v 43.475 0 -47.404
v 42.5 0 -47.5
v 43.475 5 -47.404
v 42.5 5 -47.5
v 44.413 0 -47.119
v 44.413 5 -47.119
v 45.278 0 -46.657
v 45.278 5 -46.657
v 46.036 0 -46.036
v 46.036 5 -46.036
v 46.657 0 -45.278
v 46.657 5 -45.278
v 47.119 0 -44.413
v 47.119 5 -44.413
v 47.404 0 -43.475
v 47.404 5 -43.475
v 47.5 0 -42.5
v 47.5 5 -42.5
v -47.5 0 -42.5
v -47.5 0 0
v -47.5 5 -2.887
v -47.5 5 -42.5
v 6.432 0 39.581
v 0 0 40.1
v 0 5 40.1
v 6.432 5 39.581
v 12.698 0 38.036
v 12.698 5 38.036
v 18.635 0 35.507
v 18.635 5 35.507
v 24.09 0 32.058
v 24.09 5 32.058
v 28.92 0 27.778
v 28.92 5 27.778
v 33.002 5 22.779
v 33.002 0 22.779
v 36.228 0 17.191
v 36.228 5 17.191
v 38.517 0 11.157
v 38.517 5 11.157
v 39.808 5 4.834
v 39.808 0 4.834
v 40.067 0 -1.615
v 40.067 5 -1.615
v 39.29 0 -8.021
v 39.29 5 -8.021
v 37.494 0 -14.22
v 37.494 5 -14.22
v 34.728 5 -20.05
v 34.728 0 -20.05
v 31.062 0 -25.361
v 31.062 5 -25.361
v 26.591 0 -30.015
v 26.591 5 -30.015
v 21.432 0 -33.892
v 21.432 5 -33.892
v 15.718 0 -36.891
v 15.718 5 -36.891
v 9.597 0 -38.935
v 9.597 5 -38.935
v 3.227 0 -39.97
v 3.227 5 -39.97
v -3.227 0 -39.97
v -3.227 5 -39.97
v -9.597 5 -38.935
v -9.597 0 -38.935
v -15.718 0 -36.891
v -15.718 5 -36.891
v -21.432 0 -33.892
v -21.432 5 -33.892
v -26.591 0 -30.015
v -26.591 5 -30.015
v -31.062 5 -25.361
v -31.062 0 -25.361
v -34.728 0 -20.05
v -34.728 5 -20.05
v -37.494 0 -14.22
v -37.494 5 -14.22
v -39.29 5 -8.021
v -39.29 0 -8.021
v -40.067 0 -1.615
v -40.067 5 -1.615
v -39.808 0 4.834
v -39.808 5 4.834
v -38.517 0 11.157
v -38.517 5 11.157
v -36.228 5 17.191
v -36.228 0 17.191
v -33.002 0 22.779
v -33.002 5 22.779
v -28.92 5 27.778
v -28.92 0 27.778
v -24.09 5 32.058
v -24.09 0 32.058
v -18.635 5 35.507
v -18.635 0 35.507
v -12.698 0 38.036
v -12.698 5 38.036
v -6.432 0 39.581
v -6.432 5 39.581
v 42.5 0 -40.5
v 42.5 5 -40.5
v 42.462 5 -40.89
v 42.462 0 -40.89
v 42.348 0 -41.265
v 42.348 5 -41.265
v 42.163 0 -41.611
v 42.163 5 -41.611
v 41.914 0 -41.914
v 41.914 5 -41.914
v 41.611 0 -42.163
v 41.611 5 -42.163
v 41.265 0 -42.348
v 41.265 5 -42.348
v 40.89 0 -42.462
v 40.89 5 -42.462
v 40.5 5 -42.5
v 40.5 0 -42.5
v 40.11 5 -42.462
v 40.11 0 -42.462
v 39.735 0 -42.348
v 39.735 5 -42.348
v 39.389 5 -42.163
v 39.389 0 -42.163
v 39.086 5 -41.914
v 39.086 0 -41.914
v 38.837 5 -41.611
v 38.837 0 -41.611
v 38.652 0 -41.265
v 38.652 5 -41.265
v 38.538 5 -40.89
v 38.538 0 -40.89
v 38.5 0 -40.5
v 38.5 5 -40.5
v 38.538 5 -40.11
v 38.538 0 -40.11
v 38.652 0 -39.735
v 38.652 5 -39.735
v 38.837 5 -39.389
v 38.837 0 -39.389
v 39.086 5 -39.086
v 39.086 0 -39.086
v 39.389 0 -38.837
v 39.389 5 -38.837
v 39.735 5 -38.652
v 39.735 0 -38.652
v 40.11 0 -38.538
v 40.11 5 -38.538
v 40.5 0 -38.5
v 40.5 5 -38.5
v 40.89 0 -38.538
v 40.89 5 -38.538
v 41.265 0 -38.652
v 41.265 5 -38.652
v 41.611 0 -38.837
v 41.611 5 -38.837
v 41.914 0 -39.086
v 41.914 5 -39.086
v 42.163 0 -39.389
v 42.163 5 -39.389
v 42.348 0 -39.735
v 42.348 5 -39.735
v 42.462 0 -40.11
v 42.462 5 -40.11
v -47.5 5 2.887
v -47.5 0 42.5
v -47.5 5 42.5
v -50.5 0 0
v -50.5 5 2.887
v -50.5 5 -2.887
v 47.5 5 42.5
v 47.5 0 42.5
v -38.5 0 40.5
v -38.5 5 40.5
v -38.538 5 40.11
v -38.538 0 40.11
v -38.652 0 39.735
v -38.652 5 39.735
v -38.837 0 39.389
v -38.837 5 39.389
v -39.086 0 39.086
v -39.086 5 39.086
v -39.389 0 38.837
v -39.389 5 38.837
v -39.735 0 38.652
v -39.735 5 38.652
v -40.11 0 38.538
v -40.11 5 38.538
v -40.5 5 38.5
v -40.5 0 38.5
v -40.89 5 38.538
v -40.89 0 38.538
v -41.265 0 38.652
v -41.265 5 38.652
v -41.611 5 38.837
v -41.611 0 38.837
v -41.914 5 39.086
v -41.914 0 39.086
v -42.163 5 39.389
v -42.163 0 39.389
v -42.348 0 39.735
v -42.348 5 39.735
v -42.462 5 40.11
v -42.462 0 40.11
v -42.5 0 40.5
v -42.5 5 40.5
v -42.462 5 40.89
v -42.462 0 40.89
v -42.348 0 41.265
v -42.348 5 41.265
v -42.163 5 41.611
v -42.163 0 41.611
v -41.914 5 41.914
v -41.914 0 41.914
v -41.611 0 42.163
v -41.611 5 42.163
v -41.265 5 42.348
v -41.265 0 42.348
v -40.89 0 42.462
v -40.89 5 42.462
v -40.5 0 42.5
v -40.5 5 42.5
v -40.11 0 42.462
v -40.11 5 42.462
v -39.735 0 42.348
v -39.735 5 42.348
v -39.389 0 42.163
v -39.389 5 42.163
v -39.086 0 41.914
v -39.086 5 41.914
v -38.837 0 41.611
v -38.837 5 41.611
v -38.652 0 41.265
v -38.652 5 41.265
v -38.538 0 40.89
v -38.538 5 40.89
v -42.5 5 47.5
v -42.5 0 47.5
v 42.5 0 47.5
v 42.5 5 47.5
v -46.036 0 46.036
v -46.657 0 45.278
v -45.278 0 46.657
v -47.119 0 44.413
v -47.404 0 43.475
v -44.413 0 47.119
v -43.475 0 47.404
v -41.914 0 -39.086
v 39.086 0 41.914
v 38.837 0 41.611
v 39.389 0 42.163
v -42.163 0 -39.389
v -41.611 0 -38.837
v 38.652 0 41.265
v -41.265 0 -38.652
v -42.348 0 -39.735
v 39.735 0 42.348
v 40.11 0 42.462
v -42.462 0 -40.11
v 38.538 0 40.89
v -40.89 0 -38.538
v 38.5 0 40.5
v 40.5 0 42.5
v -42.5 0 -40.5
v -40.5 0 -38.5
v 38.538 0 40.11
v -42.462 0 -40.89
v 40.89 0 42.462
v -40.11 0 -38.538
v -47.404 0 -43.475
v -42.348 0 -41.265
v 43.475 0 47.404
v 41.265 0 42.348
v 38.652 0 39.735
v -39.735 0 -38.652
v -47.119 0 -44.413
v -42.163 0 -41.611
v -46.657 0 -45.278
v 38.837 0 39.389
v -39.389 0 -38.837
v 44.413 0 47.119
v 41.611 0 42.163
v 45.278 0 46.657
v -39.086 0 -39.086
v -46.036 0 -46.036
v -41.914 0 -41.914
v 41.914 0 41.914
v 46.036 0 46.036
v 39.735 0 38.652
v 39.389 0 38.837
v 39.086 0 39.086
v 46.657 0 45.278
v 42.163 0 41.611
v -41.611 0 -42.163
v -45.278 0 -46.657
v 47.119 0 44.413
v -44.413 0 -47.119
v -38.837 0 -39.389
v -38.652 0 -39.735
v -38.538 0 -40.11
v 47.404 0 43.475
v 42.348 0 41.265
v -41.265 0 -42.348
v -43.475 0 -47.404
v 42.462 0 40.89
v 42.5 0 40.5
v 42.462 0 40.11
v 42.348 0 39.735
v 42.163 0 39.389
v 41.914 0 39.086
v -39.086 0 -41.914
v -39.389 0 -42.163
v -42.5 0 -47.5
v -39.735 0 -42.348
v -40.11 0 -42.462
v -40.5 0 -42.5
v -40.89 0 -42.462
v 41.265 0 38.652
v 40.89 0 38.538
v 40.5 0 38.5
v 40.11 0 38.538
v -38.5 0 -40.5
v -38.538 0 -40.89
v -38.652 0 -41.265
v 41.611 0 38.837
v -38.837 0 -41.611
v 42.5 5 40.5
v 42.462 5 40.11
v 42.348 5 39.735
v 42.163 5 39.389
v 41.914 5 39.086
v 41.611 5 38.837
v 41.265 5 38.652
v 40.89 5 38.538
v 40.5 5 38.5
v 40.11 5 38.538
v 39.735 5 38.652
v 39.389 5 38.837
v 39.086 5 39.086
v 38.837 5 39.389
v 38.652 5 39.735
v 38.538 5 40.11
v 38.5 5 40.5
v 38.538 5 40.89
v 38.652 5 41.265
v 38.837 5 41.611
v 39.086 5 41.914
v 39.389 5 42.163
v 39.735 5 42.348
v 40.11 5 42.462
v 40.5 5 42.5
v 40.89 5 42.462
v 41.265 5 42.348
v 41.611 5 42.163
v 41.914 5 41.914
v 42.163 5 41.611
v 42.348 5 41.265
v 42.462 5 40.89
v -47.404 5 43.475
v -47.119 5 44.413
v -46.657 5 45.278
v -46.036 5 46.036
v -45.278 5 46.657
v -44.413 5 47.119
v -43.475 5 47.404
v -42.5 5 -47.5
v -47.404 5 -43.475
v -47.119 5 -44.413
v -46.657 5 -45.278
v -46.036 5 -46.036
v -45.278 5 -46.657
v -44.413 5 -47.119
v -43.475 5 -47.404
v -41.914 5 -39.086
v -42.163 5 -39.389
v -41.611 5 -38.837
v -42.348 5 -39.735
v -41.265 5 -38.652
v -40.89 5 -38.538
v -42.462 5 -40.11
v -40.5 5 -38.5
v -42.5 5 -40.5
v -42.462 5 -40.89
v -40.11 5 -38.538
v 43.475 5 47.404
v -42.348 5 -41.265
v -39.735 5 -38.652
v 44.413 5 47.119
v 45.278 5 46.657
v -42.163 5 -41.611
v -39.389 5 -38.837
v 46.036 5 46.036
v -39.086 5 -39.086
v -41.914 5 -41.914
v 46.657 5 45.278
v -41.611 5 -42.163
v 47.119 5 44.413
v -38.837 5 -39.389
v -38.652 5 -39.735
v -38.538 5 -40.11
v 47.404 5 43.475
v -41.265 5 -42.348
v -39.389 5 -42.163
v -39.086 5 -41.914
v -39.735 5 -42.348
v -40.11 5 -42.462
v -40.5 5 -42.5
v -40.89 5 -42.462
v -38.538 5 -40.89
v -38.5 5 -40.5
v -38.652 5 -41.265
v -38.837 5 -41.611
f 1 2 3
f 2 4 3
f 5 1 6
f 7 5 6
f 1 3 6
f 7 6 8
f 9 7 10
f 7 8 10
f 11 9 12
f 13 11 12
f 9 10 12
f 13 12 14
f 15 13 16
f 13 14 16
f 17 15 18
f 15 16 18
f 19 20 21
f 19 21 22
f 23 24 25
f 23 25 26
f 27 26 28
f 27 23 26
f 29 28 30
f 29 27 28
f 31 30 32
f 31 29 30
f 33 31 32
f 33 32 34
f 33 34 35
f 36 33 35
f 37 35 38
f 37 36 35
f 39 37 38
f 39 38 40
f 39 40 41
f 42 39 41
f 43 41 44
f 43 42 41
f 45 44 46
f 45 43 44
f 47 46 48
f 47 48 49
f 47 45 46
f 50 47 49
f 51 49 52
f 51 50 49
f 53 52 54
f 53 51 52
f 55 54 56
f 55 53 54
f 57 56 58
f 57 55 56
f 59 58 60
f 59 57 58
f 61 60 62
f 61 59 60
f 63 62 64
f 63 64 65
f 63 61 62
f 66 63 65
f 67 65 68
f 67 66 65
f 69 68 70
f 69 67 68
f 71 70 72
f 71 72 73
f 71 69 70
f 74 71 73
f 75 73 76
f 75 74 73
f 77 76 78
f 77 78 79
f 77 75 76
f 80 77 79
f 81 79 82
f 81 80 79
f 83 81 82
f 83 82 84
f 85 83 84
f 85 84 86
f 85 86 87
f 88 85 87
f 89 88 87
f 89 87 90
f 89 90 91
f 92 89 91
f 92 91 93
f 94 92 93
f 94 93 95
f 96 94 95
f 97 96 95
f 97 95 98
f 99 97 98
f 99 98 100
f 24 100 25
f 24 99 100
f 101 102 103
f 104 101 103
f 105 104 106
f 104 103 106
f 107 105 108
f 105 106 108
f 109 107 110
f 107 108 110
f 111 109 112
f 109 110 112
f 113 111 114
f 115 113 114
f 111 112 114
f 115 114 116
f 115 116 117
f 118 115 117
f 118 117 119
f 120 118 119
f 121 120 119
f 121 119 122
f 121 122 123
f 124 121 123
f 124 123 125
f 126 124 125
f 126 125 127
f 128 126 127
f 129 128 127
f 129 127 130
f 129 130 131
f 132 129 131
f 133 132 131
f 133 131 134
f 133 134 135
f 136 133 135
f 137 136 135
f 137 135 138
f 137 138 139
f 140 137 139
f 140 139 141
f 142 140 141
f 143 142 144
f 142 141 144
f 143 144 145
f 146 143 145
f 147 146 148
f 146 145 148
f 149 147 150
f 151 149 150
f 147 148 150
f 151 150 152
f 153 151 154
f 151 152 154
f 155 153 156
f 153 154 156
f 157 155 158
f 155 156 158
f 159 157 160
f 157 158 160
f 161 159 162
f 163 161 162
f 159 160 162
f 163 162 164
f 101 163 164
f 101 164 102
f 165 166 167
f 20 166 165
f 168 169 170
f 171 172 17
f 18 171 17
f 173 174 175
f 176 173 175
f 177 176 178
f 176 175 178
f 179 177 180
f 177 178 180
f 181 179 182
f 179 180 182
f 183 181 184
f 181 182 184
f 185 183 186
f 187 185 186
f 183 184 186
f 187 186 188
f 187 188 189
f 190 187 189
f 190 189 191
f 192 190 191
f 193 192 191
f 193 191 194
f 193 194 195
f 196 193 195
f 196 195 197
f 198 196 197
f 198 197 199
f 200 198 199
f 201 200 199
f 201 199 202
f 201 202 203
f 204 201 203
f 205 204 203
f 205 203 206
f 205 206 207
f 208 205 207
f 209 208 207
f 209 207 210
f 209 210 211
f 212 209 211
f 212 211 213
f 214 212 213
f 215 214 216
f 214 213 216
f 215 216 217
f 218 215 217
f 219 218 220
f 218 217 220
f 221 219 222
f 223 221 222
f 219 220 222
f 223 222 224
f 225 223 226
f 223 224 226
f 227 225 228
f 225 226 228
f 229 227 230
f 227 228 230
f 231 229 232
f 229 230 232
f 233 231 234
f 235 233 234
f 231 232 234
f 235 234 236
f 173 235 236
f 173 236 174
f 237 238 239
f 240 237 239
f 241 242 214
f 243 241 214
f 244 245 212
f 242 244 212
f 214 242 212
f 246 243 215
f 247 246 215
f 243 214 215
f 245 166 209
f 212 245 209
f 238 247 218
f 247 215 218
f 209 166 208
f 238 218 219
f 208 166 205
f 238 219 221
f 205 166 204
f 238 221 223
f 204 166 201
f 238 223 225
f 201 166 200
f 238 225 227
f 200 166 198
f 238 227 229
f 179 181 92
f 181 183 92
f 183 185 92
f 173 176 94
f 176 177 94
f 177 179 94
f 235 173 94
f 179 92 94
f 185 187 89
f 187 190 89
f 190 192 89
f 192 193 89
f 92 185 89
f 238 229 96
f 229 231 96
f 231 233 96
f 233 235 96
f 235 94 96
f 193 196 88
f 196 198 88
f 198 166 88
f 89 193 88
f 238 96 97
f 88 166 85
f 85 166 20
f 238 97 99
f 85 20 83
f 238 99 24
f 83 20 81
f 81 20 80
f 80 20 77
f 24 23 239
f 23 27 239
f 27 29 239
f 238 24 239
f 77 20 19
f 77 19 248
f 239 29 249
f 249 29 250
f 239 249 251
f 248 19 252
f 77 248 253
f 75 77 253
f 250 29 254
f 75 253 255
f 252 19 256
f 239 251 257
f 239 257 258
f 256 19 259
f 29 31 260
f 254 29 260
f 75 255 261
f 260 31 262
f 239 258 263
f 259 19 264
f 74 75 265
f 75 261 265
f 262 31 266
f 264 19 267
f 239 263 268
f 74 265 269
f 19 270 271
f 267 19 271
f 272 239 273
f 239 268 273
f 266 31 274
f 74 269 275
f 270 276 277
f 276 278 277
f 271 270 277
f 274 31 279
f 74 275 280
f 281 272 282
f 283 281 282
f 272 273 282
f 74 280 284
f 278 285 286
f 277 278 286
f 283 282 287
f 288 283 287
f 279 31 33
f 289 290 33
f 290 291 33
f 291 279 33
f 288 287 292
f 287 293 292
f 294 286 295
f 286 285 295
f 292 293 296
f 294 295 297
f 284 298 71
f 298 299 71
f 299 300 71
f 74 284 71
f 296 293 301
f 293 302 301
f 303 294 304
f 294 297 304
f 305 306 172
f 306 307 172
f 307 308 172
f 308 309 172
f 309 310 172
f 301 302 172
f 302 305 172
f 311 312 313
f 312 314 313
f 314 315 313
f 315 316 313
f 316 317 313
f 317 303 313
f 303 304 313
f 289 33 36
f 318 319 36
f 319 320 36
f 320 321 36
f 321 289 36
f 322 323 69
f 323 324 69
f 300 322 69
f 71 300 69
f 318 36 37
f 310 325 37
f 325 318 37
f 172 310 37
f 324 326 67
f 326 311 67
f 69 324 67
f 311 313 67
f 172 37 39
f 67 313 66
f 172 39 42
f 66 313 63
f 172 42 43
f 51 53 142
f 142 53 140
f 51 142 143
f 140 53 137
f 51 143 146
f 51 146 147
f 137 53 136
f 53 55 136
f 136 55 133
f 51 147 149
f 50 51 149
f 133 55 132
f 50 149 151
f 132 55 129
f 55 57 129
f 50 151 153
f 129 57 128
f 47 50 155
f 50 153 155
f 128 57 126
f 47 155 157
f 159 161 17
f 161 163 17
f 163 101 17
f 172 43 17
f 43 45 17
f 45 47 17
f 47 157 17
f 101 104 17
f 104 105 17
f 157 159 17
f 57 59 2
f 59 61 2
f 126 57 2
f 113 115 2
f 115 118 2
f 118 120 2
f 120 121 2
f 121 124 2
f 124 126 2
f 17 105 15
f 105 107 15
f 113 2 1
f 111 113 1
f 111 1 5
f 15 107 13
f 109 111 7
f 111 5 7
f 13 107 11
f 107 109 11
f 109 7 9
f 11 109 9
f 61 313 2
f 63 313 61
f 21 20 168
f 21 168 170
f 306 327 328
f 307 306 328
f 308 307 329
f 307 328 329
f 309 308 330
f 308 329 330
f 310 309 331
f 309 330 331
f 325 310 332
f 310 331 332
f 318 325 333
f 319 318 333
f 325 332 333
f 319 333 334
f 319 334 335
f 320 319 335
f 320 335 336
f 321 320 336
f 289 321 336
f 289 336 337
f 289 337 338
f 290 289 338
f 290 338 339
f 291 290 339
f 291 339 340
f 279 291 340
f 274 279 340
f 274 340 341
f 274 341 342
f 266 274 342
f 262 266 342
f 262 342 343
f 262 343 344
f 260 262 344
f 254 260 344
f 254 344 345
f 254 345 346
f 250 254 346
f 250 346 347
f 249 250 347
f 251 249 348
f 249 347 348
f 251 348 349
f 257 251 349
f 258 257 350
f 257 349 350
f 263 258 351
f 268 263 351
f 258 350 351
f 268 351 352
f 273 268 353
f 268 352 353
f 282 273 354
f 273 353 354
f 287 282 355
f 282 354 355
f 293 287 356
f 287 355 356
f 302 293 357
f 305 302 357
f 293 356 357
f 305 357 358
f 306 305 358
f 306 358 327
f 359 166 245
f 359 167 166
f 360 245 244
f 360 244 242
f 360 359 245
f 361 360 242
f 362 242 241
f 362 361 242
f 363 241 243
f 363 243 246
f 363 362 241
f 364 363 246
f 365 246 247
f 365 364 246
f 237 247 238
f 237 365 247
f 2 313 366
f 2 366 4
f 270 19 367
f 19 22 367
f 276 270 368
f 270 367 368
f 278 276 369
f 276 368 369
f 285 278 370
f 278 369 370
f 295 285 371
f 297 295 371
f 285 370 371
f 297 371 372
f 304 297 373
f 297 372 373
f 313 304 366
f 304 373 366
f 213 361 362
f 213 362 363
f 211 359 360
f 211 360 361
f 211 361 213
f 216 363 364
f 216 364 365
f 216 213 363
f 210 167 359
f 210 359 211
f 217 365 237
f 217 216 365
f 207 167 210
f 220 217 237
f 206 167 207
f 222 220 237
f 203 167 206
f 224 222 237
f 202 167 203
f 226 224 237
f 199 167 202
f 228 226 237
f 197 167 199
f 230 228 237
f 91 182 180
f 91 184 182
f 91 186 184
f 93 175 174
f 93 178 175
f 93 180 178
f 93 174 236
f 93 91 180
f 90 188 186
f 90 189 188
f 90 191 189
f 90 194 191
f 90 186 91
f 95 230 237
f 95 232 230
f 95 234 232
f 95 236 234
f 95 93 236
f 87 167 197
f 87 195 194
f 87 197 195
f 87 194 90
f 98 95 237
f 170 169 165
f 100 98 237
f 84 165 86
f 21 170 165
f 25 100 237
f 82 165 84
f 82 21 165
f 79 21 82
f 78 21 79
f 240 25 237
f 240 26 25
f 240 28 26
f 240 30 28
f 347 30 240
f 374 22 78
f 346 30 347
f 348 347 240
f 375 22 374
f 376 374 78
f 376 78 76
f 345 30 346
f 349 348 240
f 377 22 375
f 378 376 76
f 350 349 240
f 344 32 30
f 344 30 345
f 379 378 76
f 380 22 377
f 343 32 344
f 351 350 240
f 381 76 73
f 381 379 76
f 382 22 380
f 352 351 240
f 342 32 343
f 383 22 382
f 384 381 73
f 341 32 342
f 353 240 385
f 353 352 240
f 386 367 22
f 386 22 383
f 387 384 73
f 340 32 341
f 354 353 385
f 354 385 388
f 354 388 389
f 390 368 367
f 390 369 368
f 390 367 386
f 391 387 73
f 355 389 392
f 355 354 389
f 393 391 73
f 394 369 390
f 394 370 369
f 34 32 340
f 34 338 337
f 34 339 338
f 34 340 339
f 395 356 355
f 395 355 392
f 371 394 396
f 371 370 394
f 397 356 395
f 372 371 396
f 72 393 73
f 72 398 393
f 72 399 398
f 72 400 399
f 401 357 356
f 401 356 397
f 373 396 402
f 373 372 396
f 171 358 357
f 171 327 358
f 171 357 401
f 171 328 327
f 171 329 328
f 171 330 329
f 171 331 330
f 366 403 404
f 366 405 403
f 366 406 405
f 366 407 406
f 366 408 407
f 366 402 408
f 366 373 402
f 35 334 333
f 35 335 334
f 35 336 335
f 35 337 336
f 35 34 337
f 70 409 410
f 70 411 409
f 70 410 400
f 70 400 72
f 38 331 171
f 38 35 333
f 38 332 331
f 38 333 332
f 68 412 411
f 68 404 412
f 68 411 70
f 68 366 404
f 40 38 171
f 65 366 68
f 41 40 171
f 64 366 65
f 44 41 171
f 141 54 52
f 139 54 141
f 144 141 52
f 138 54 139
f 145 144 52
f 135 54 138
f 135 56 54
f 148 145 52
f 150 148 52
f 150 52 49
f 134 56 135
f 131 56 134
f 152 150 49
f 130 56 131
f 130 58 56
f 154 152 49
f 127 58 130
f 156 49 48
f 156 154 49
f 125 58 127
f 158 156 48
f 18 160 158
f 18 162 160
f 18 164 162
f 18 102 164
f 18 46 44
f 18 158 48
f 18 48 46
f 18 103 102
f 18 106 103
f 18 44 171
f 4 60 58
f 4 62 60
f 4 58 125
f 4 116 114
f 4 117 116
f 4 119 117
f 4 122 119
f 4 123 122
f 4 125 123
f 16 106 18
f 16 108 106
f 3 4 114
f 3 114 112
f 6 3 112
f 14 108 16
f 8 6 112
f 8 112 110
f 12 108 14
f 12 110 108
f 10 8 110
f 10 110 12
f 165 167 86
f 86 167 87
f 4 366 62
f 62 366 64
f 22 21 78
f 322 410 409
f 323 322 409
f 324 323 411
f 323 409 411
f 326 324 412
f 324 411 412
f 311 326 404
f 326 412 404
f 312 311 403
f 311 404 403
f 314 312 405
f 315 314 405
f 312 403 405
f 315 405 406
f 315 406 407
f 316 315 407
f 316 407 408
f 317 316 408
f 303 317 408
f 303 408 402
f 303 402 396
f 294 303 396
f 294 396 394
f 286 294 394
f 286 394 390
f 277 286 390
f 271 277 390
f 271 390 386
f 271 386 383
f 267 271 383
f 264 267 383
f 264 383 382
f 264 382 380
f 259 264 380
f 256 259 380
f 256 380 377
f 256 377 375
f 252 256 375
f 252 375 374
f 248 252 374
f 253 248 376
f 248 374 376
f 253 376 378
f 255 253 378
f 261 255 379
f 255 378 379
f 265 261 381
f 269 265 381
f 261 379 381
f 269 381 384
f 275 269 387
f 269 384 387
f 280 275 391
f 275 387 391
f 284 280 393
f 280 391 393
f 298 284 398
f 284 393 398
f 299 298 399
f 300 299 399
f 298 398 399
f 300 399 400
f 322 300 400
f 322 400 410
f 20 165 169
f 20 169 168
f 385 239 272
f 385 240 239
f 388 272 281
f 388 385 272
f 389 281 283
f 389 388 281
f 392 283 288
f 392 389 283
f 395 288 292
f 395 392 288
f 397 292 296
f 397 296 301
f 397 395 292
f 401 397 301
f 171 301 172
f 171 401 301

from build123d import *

# Parameters (mm, degrees)
SKETCH1_W             = 95
SKETCH1_H             = 95
SKETCH1_W_2           = 81
SKETCH1_H_2           = 81
SKETCH1_R             = 40.1
BOSS_EXTRUDE1_DEPTH   = 5
F_4_0MM_DOWEL_HOLE1_D = 4
BOSS_EXTRUDE2_DEPTH   = 3
FILLET1_R             = 5


with BuildPart() as part:
    # Sketch1 → Boss-Extrude1 (new body)
    # profile 1 of 2: a face of its own
    with BuildSketch(Plane(origin=(0, 0, 0), x_dir=(1, 0, 0), z_dir=(0, 1, 0))):
        Rectangle(SKETCH1_W, SKETCH1_H)
        Rectangle(SKETCH1_W_2, SKETCH1_H_2, mode=Mode.SUBTRACT)
    # profile 2 of 2: a face of its own
    with BuildSketch(Plane(origin=(0, 0, 0), x_dir=(1, 0, 0), z_dir=(0, 1, 0))):
        Rectangle(SKETCH1_W_2, SKETCH1_H_2)
        with Locations(Location((0, 0, 0), (0, 0, 270))):
            Circle(SKETCH1_R, mode=Mode.SUBTRACT)
    extrude(amount=BOSS_EXTRUDE1_DEPTH)

    # Ø4.0mm Dowel Hole1 (through all)
    with Locations(Plane(origin=(0, 0, 0), x_dir=(-1, 0, 0), z_dir=(0, -1, 0))):
        with Locations((40.5, -40.5), (-40.5, -40.5), (-40.5, 40.5), (40.5, 40.5)):
            Hole(F_4_0MM_DOWEL_HOLE1_D / 2)

    # Sketch5 → Boss-Extrude2 (add)
    with BuildSketch(Plane.ZY.offset(47.5)):
        Polygon((0, 0), (-2.886751346, 5), (2.886751346, 5), align=None)
    extrude(amount=BOSS_EXTRUDE2_DEPTH)

    # Fillet1
    fillet1_edges = [part.edges().sort_by_distance(p)[0] for p in [
        (-47.5, 2.5, 47.5),
        (-47.5, 2.5, -47.5),
        (47.5, 2.5, -47.5),
        (47.5, 2.5, 47.5),
    ]]
    fillet(fillet1_edges, radius=FILLET1_R)


solid = part.part
